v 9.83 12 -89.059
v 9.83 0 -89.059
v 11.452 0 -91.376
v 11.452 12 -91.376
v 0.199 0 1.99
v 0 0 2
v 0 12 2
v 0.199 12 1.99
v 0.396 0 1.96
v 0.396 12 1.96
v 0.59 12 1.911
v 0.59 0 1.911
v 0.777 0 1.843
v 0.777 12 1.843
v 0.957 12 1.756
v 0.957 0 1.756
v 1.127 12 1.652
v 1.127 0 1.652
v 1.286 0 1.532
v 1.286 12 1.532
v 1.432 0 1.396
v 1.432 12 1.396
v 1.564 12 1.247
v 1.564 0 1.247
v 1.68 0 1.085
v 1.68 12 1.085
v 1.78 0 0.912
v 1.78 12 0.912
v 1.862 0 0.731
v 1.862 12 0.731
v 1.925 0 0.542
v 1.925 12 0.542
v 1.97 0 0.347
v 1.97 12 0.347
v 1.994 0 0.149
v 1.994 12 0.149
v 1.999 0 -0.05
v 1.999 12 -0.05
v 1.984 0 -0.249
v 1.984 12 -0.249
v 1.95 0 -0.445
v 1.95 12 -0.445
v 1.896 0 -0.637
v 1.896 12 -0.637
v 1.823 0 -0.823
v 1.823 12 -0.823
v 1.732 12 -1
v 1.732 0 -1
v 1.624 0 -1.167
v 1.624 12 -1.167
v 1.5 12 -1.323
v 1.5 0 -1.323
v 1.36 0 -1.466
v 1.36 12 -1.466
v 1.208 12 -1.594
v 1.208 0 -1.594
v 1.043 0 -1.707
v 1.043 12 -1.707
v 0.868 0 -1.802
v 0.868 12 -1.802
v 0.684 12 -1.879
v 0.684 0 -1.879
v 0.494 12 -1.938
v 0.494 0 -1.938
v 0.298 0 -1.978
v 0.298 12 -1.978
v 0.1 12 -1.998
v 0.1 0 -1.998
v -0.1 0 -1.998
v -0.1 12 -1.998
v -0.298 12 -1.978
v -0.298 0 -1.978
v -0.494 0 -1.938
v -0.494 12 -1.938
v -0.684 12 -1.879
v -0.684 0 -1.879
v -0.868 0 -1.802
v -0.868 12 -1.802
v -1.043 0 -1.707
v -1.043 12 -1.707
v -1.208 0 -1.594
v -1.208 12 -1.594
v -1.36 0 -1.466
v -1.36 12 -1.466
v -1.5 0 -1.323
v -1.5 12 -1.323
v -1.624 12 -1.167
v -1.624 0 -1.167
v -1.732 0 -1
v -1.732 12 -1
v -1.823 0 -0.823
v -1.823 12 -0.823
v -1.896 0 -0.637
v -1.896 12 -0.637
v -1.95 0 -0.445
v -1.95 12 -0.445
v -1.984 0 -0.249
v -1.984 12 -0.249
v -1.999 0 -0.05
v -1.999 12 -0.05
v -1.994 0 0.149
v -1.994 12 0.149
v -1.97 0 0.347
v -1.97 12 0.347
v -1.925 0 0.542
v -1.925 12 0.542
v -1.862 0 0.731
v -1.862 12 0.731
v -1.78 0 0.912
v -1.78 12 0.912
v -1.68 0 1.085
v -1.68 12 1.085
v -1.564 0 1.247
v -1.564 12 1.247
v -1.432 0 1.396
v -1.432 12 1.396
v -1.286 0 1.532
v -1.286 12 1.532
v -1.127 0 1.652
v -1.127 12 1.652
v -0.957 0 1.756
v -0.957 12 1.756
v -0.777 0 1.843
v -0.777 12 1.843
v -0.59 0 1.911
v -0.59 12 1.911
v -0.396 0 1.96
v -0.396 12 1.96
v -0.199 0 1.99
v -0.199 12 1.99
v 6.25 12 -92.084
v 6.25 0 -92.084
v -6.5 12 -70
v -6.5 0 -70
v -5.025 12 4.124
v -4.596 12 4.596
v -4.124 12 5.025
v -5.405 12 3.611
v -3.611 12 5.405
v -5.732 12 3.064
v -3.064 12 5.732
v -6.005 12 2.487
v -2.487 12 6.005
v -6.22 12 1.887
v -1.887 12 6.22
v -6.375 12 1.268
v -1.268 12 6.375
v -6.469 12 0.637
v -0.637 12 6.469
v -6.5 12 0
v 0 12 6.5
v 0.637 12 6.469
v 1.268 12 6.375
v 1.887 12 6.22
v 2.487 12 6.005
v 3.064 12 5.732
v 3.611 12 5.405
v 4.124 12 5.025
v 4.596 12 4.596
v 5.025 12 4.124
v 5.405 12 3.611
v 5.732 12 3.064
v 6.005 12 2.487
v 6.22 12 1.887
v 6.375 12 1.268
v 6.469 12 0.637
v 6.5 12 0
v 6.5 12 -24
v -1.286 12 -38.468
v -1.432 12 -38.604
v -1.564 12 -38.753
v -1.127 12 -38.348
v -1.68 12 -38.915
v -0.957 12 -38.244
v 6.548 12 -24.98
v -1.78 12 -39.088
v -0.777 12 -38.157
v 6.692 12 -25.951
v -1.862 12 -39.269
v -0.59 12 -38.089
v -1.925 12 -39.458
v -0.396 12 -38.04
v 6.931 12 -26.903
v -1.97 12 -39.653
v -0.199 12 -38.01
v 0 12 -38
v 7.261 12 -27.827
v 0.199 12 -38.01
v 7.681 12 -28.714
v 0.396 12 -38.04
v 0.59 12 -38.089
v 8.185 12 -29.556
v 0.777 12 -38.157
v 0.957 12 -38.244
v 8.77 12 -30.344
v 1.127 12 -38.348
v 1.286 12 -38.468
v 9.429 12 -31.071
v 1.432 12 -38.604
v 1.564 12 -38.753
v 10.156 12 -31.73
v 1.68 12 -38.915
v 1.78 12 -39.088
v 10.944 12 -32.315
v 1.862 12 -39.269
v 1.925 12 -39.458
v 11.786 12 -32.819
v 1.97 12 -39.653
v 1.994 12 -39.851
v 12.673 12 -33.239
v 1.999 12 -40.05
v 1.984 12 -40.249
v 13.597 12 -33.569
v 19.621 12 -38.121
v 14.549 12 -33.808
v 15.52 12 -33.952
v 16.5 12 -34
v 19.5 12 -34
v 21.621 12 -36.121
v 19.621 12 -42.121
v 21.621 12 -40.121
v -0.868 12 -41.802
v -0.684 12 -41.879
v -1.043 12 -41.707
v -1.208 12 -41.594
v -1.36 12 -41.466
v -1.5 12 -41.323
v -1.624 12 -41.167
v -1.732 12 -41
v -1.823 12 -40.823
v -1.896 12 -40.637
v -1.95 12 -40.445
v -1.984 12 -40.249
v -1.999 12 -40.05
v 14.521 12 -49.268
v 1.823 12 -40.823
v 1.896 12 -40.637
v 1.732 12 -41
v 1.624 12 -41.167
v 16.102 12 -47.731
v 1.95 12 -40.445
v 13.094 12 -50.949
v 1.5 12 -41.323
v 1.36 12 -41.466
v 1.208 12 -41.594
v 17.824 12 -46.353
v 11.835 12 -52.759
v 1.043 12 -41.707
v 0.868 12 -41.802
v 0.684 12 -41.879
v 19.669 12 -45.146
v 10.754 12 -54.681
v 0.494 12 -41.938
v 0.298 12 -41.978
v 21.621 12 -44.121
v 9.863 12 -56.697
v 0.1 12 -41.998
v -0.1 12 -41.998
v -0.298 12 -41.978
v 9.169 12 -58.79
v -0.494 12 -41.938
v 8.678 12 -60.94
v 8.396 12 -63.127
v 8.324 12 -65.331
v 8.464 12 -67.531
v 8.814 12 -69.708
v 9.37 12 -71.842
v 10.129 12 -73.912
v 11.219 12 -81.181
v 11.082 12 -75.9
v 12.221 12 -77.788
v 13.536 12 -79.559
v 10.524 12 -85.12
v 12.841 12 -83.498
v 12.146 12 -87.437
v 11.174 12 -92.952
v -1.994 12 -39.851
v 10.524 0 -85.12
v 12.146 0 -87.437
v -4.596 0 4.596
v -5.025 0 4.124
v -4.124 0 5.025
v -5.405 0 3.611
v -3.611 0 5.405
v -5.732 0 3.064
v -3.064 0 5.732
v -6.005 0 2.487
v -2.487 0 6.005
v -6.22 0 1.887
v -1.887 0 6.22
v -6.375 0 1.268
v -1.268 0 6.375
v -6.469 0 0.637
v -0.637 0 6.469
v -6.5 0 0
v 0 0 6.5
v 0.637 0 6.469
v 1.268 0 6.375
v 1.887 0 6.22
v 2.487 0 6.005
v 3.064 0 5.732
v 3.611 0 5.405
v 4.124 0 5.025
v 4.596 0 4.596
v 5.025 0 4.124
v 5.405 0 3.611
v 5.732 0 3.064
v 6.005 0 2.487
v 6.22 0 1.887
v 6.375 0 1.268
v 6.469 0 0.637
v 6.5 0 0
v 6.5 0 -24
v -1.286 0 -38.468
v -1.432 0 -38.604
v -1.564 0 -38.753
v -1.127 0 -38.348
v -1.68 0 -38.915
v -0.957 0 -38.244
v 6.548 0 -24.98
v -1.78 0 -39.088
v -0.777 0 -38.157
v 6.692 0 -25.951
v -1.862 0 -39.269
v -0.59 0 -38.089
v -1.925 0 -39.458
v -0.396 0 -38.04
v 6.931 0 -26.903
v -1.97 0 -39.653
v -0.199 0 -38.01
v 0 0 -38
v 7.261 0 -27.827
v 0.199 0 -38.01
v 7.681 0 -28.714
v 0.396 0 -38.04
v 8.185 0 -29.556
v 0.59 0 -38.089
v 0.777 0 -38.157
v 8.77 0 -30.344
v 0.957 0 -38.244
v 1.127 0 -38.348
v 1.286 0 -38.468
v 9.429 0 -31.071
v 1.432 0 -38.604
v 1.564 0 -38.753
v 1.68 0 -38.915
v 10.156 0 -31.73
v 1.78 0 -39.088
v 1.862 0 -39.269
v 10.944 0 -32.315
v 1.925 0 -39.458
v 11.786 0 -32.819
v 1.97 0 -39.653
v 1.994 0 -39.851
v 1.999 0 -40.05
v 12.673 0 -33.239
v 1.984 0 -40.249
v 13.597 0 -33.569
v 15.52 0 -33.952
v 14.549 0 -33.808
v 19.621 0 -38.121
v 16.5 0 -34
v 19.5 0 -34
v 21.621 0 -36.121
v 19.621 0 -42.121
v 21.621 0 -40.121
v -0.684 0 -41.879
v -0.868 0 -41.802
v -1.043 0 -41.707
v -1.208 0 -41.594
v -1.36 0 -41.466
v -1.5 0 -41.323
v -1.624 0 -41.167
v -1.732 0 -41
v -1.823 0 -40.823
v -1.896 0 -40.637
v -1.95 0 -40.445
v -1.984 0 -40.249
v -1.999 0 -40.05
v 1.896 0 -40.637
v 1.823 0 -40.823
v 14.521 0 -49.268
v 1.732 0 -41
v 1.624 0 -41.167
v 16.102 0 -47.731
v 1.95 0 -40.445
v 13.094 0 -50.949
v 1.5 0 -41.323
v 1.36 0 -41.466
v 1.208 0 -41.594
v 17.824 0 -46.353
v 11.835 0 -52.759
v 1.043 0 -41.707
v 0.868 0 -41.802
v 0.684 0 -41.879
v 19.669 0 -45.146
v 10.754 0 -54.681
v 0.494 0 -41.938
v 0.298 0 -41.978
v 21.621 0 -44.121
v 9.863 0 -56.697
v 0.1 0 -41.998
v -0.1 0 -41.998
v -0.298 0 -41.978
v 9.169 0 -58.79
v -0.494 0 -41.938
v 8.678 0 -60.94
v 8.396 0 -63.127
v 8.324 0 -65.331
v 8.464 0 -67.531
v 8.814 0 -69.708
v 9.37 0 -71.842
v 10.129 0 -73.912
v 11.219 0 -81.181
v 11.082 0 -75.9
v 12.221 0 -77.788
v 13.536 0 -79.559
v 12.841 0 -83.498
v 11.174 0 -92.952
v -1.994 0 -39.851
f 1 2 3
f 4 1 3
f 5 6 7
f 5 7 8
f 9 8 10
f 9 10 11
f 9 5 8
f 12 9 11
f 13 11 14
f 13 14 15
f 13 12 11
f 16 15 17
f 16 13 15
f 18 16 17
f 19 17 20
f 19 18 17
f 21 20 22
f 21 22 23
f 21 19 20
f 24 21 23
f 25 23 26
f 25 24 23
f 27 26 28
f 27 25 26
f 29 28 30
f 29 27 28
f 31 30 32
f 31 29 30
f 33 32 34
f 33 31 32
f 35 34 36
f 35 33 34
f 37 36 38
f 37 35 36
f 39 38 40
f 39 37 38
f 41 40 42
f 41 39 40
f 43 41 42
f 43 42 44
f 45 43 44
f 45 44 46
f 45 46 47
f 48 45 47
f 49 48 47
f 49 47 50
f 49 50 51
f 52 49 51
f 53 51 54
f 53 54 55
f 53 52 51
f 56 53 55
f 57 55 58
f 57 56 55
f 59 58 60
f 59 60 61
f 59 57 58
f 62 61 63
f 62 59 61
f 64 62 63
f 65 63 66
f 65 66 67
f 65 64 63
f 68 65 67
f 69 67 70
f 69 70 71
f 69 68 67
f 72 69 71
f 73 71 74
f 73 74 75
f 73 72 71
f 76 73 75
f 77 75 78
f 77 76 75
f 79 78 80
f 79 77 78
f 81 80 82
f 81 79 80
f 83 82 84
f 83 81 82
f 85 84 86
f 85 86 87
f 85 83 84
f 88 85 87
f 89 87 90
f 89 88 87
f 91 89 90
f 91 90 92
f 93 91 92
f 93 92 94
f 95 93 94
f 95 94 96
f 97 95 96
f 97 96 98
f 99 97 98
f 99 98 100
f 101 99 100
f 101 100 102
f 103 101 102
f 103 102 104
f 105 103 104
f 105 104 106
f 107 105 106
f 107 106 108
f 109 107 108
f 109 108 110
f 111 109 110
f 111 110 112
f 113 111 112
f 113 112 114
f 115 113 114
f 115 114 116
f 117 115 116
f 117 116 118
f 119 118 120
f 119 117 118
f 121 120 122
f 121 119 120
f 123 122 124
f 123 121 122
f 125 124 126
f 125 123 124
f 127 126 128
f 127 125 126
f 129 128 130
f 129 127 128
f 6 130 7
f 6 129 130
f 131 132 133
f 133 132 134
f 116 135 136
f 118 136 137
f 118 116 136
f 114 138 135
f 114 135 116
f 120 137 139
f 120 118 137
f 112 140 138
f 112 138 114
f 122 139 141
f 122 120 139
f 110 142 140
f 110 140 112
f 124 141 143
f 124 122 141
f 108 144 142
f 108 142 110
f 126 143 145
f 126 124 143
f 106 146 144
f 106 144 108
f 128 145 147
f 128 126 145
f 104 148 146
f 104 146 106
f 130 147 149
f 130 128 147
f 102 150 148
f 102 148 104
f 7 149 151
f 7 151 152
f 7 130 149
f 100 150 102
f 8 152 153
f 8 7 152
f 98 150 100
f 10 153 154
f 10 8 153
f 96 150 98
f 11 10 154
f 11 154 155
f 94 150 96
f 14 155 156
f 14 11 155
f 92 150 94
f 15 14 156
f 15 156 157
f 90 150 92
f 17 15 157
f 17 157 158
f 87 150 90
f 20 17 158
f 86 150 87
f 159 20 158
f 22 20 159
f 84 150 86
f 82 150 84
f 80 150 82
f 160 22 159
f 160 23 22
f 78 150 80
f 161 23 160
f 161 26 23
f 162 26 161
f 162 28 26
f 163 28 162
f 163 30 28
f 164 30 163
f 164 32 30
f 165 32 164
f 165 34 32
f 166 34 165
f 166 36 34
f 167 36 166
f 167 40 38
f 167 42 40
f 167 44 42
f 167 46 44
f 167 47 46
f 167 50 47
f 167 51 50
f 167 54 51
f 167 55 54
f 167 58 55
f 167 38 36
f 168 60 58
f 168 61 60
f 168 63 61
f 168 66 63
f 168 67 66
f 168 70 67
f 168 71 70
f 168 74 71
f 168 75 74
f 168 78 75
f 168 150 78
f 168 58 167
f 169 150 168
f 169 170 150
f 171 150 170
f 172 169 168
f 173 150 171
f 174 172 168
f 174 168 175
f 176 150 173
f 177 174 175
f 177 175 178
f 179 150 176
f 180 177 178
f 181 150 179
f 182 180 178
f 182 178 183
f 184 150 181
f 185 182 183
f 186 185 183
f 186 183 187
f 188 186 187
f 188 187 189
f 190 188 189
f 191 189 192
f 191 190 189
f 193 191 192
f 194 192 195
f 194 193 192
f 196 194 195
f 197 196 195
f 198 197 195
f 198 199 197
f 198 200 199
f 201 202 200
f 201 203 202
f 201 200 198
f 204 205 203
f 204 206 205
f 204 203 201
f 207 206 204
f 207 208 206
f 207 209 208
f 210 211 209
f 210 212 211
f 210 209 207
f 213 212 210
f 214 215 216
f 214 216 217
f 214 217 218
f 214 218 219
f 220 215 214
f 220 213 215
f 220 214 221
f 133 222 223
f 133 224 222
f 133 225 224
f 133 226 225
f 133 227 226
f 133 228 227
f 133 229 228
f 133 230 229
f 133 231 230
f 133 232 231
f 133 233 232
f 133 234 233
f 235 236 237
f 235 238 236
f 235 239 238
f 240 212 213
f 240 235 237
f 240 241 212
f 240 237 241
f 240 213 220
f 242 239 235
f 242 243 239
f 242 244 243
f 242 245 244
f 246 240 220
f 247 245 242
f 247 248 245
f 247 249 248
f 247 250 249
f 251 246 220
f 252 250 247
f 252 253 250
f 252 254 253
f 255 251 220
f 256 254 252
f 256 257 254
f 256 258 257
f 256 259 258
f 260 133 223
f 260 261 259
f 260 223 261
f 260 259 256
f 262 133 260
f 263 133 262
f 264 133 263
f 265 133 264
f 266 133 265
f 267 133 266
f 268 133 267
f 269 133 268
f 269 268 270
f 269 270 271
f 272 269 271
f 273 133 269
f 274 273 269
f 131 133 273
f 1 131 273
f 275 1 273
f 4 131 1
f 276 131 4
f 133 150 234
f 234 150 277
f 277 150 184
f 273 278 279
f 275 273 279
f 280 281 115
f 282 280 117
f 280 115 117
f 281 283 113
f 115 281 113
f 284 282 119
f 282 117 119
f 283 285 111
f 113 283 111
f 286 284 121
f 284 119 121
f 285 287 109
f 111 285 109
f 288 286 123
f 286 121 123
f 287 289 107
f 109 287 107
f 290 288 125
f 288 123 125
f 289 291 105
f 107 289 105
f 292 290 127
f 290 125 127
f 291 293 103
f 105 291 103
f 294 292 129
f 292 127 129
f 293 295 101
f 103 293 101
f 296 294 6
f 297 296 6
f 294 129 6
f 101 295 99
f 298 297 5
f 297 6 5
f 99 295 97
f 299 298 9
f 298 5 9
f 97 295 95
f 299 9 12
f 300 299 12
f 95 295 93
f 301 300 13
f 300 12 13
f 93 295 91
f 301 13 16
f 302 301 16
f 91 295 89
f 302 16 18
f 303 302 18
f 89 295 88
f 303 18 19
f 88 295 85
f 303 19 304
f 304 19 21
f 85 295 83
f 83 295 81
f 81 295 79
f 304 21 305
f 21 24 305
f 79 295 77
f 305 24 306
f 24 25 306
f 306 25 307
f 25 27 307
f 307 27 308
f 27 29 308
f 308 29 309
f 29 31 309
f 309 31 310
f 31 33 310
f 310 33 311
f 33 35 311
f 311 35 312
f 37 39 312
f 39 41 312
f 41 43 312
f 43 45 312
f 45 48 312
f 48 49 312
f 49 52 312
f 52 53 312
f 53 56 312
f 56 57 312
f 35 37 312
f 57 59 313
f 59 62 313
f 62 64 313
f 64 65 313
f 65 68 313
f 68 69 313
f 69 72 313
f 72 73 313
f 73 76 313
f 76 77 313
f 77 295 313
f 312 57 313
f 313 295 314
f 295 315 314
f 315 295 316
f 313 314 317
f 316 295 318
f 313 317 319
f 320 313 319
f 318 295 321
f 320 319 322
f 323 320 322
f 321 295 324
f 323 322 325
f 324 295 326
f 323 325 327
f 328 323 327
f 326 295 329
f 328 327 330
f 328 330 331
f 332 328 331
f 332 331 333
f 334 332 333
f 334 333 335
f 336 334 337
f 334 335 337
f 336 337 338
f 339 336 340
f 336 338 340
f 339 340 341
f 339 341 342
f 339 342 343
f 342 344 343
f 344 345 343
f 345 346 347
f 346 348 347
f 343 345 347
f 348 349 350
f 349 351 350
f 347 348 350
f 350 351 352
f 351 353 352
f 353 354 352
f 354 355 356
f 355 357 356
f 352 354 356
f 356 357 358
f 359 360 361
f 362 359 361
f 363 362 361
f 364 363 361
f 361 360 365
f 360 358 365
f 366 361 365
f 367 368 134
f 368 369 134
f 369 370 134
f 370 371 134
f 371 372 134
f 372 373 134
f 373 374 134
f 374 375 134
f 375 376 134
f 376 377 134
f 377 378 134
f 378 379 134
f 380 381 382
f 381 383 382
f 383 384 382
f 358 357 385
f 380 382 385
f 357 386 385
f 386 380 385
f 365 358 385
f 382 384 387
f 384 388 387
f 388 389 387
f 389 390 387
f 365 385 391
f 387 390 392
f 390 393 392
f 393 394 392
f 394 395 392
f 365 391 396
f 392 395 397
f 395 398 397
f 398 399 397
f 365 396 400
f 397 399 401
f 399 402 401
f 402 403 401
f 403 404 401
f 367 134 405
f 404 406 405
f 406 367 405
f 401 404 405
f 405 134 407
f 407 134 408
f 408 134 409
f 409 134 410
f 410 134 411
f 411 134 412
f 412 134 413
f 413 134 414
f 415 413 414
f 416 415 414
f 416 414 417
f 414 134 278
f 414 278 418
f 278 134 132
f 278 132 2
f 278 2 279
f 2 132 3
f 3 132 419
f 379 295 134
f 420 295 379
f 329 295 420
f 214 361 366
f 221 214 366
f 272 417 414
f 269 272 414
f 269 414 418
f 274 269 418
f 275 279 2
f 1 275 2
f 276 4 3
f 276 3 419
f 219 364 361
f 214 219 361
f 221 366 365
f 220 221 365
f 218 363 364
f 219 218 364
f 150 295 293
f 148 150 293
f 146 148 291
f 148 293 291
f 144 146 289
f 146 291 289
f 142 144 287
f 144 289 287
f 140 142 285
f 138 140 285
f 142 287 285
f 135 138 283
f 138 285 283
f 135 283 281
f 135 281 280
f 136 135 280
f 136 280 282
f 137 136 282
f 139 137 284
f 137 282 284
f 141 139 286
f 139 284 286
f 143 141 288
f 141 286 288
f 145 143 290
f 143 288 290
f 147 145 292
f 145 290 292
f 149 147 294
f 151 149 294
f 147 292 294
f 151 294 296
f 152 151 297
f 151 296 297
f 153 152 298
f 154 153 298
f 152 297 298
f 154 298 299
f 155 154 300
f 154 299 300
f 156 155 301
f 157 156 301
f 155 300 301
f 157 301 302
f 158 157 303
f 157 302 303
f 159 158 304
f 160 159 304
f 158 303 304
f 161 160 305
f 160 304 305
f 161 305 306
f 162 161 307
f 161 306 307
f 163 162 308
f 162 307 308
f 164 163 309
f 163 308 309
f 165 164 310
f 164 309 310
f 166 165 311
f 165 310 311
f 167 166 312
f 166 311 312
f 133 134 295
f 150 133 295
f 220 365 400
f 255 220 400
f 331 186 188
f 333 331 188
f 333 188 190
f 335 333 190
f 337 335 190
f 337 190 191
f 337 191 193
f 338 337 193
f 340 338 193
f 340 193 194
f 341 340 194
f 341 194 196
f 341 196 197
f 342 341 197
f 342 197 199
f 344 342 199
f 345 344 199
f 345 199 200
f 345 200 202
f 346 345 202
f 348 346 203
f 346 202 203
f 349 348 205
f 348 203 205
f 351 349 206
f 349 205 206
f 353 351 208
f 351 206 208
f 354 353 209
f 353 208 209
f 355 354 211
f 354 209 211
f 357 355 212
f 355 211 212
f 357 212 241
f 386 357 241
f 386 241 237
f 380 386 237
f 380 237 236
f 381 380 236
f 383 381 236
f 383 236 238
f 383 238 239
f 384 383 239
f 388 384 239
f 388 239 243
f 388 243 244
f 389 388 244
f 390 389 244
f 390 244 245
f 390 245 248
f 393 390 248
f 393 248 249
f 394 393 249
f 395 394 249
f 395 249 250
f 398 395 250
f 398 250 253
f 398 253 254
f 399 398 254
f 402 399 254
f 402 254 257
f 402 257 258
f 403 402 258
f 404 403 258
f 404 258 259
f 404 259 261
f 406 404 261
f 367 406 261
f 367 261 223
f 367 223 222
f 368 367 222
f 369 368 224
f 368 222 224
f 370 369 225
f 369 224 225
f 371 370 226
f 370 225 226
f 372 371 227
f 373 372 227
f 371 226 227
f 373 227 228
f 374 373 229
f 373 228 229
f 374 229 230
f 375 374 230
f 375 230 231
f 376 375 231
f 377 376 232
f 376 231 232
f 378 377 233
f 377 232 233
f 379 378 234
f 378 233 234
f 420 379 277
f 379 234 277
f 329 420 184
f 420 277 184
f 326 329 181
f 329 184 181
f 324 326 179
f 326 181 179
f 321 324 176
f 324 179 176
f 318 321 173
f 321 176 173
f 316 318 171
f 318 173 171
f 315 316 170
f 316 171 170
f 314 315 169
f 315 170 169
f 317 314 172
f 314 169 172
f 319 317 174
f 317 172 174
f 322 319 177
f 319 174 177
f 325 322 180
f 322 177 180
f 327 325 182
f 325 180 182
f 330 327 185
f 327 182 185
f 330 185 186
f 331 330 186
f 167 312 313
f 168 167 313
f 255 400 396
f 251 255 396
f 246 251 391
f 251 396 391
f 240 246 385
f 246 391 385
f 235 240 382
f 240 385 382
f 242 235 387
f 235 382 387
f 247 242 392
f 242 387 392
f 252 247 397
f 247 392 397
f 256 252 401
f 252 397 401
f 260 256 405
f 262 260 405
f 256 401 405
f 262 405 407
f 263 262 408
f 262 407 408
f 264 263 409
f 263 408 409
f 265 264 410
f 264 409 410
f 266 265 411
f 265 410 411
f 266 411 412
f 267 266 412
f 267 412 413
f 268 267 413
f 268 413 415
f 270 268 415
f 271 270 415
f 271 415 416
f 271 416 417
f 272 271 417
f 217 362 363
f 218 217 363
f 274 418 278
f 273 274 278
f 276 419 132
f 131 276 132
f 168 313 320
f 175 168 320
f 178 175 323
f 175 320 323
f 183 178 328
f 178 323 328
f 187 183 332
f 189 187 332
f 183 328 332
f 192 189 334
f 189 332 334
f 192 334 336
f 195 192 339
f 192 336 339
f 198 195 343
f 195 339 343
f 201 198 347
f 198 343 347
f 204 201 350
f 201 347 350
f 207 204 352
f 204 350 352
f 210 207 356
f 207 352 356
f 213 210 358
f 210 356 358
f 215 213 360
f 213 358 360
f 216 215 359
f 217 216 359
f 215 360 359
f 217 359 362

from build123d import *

# Parameters (mm, degrees)
CROQUIS2_R              = 2
SALIENTE_EXTRUIR1_DEPTH = 12
SKETCH1_R               = 2
CUT_EXTRUDE1_DEPTH      = 97.1849006


with BuildPart() as part:
    # Croquis2 → Saliente-Extruir1 (new body)
    with BuildSketch(Plane(origin=(0, 0, 0), x_dir=(1, 0, 0), z_dir=(0, 1, 0))):
        with BuildLine():
            Line((-6.5, 70), (-6.5, 0))
            ThreePointArc((-6.5, 0), (0, -6.5), (6.5, 0))
            Line((6.5, 0), (6.5, 24))
            ThreePointArc((6.5, 24), (9.428932188, 31.071067812), (16.5, 34))
            Line((16.5, 34), (19.5, 34))
            Line((19.5, 34), (21.621320344, 36.121320344))
            Line((21.621320344, 36.121320344), (19.621320344, 38.121320344))
            Line((19.621320344, 38.121320344), (21.621320344, 40.121320344))
            Line((21.621320344, 40.121320344), (19.621320344, 42.121320344))
            Line((19.621320344, 42.121320344), (21.621320344, 44.121320344))
            ThreePointArc((21.621320344, 44.121320344), (8.897927721, 59.859277281), (13.535653981, 79.558503244))
            Line((13.535653981, 79.558503244), (11.21874212, 81.180822395))
            Line((11.21874212, 81.180822395), (12.841061271, 83.497734256))
            Line((12.841061271, 83.497734256), (10.524149409, 85.120053407))
            Line((10.524149409, 85.120053407), (12.14646856, 87.436965268))
            Line((12.14646856, 87.436965268), (9.829556699, 89.059284419))
            Line((9.829556699, 89.059284419), (11.451875849, 91.37619628))
            Line((11.451875849, 91.37619628), (11.174038765, 92.951888685))
            Line((11.174038765, 92.951888685), (6.25, 92.083647797))
            Line((6.25, 92.083647797), (-6.5, 70))
        make_face()
        with Locations(Location((0, 0, 0), (0, 0, 270))):
            Circle(CROQUIS2_R, mode=Mode.SUBTRACT)
    extrude(amount=SALIENTE_EXTRUIR1_DEPTH)

    # Sketch1 → Cut-Extrude1 (cut, through all)
    with BuildSketch(Plane(origin=(0, 12, 0), x_dir=(1, 0, 0), z_dir=(0, 1, 0))):
        with Locations(Location((0, 40, 0), (0, 0, 270))):
            Circle(SKETCH1_R)
    extrude(amount=-CUT_EXTRUDE1_DEPTH, mode=Mode.SUBTRACT)


solid = part.part
